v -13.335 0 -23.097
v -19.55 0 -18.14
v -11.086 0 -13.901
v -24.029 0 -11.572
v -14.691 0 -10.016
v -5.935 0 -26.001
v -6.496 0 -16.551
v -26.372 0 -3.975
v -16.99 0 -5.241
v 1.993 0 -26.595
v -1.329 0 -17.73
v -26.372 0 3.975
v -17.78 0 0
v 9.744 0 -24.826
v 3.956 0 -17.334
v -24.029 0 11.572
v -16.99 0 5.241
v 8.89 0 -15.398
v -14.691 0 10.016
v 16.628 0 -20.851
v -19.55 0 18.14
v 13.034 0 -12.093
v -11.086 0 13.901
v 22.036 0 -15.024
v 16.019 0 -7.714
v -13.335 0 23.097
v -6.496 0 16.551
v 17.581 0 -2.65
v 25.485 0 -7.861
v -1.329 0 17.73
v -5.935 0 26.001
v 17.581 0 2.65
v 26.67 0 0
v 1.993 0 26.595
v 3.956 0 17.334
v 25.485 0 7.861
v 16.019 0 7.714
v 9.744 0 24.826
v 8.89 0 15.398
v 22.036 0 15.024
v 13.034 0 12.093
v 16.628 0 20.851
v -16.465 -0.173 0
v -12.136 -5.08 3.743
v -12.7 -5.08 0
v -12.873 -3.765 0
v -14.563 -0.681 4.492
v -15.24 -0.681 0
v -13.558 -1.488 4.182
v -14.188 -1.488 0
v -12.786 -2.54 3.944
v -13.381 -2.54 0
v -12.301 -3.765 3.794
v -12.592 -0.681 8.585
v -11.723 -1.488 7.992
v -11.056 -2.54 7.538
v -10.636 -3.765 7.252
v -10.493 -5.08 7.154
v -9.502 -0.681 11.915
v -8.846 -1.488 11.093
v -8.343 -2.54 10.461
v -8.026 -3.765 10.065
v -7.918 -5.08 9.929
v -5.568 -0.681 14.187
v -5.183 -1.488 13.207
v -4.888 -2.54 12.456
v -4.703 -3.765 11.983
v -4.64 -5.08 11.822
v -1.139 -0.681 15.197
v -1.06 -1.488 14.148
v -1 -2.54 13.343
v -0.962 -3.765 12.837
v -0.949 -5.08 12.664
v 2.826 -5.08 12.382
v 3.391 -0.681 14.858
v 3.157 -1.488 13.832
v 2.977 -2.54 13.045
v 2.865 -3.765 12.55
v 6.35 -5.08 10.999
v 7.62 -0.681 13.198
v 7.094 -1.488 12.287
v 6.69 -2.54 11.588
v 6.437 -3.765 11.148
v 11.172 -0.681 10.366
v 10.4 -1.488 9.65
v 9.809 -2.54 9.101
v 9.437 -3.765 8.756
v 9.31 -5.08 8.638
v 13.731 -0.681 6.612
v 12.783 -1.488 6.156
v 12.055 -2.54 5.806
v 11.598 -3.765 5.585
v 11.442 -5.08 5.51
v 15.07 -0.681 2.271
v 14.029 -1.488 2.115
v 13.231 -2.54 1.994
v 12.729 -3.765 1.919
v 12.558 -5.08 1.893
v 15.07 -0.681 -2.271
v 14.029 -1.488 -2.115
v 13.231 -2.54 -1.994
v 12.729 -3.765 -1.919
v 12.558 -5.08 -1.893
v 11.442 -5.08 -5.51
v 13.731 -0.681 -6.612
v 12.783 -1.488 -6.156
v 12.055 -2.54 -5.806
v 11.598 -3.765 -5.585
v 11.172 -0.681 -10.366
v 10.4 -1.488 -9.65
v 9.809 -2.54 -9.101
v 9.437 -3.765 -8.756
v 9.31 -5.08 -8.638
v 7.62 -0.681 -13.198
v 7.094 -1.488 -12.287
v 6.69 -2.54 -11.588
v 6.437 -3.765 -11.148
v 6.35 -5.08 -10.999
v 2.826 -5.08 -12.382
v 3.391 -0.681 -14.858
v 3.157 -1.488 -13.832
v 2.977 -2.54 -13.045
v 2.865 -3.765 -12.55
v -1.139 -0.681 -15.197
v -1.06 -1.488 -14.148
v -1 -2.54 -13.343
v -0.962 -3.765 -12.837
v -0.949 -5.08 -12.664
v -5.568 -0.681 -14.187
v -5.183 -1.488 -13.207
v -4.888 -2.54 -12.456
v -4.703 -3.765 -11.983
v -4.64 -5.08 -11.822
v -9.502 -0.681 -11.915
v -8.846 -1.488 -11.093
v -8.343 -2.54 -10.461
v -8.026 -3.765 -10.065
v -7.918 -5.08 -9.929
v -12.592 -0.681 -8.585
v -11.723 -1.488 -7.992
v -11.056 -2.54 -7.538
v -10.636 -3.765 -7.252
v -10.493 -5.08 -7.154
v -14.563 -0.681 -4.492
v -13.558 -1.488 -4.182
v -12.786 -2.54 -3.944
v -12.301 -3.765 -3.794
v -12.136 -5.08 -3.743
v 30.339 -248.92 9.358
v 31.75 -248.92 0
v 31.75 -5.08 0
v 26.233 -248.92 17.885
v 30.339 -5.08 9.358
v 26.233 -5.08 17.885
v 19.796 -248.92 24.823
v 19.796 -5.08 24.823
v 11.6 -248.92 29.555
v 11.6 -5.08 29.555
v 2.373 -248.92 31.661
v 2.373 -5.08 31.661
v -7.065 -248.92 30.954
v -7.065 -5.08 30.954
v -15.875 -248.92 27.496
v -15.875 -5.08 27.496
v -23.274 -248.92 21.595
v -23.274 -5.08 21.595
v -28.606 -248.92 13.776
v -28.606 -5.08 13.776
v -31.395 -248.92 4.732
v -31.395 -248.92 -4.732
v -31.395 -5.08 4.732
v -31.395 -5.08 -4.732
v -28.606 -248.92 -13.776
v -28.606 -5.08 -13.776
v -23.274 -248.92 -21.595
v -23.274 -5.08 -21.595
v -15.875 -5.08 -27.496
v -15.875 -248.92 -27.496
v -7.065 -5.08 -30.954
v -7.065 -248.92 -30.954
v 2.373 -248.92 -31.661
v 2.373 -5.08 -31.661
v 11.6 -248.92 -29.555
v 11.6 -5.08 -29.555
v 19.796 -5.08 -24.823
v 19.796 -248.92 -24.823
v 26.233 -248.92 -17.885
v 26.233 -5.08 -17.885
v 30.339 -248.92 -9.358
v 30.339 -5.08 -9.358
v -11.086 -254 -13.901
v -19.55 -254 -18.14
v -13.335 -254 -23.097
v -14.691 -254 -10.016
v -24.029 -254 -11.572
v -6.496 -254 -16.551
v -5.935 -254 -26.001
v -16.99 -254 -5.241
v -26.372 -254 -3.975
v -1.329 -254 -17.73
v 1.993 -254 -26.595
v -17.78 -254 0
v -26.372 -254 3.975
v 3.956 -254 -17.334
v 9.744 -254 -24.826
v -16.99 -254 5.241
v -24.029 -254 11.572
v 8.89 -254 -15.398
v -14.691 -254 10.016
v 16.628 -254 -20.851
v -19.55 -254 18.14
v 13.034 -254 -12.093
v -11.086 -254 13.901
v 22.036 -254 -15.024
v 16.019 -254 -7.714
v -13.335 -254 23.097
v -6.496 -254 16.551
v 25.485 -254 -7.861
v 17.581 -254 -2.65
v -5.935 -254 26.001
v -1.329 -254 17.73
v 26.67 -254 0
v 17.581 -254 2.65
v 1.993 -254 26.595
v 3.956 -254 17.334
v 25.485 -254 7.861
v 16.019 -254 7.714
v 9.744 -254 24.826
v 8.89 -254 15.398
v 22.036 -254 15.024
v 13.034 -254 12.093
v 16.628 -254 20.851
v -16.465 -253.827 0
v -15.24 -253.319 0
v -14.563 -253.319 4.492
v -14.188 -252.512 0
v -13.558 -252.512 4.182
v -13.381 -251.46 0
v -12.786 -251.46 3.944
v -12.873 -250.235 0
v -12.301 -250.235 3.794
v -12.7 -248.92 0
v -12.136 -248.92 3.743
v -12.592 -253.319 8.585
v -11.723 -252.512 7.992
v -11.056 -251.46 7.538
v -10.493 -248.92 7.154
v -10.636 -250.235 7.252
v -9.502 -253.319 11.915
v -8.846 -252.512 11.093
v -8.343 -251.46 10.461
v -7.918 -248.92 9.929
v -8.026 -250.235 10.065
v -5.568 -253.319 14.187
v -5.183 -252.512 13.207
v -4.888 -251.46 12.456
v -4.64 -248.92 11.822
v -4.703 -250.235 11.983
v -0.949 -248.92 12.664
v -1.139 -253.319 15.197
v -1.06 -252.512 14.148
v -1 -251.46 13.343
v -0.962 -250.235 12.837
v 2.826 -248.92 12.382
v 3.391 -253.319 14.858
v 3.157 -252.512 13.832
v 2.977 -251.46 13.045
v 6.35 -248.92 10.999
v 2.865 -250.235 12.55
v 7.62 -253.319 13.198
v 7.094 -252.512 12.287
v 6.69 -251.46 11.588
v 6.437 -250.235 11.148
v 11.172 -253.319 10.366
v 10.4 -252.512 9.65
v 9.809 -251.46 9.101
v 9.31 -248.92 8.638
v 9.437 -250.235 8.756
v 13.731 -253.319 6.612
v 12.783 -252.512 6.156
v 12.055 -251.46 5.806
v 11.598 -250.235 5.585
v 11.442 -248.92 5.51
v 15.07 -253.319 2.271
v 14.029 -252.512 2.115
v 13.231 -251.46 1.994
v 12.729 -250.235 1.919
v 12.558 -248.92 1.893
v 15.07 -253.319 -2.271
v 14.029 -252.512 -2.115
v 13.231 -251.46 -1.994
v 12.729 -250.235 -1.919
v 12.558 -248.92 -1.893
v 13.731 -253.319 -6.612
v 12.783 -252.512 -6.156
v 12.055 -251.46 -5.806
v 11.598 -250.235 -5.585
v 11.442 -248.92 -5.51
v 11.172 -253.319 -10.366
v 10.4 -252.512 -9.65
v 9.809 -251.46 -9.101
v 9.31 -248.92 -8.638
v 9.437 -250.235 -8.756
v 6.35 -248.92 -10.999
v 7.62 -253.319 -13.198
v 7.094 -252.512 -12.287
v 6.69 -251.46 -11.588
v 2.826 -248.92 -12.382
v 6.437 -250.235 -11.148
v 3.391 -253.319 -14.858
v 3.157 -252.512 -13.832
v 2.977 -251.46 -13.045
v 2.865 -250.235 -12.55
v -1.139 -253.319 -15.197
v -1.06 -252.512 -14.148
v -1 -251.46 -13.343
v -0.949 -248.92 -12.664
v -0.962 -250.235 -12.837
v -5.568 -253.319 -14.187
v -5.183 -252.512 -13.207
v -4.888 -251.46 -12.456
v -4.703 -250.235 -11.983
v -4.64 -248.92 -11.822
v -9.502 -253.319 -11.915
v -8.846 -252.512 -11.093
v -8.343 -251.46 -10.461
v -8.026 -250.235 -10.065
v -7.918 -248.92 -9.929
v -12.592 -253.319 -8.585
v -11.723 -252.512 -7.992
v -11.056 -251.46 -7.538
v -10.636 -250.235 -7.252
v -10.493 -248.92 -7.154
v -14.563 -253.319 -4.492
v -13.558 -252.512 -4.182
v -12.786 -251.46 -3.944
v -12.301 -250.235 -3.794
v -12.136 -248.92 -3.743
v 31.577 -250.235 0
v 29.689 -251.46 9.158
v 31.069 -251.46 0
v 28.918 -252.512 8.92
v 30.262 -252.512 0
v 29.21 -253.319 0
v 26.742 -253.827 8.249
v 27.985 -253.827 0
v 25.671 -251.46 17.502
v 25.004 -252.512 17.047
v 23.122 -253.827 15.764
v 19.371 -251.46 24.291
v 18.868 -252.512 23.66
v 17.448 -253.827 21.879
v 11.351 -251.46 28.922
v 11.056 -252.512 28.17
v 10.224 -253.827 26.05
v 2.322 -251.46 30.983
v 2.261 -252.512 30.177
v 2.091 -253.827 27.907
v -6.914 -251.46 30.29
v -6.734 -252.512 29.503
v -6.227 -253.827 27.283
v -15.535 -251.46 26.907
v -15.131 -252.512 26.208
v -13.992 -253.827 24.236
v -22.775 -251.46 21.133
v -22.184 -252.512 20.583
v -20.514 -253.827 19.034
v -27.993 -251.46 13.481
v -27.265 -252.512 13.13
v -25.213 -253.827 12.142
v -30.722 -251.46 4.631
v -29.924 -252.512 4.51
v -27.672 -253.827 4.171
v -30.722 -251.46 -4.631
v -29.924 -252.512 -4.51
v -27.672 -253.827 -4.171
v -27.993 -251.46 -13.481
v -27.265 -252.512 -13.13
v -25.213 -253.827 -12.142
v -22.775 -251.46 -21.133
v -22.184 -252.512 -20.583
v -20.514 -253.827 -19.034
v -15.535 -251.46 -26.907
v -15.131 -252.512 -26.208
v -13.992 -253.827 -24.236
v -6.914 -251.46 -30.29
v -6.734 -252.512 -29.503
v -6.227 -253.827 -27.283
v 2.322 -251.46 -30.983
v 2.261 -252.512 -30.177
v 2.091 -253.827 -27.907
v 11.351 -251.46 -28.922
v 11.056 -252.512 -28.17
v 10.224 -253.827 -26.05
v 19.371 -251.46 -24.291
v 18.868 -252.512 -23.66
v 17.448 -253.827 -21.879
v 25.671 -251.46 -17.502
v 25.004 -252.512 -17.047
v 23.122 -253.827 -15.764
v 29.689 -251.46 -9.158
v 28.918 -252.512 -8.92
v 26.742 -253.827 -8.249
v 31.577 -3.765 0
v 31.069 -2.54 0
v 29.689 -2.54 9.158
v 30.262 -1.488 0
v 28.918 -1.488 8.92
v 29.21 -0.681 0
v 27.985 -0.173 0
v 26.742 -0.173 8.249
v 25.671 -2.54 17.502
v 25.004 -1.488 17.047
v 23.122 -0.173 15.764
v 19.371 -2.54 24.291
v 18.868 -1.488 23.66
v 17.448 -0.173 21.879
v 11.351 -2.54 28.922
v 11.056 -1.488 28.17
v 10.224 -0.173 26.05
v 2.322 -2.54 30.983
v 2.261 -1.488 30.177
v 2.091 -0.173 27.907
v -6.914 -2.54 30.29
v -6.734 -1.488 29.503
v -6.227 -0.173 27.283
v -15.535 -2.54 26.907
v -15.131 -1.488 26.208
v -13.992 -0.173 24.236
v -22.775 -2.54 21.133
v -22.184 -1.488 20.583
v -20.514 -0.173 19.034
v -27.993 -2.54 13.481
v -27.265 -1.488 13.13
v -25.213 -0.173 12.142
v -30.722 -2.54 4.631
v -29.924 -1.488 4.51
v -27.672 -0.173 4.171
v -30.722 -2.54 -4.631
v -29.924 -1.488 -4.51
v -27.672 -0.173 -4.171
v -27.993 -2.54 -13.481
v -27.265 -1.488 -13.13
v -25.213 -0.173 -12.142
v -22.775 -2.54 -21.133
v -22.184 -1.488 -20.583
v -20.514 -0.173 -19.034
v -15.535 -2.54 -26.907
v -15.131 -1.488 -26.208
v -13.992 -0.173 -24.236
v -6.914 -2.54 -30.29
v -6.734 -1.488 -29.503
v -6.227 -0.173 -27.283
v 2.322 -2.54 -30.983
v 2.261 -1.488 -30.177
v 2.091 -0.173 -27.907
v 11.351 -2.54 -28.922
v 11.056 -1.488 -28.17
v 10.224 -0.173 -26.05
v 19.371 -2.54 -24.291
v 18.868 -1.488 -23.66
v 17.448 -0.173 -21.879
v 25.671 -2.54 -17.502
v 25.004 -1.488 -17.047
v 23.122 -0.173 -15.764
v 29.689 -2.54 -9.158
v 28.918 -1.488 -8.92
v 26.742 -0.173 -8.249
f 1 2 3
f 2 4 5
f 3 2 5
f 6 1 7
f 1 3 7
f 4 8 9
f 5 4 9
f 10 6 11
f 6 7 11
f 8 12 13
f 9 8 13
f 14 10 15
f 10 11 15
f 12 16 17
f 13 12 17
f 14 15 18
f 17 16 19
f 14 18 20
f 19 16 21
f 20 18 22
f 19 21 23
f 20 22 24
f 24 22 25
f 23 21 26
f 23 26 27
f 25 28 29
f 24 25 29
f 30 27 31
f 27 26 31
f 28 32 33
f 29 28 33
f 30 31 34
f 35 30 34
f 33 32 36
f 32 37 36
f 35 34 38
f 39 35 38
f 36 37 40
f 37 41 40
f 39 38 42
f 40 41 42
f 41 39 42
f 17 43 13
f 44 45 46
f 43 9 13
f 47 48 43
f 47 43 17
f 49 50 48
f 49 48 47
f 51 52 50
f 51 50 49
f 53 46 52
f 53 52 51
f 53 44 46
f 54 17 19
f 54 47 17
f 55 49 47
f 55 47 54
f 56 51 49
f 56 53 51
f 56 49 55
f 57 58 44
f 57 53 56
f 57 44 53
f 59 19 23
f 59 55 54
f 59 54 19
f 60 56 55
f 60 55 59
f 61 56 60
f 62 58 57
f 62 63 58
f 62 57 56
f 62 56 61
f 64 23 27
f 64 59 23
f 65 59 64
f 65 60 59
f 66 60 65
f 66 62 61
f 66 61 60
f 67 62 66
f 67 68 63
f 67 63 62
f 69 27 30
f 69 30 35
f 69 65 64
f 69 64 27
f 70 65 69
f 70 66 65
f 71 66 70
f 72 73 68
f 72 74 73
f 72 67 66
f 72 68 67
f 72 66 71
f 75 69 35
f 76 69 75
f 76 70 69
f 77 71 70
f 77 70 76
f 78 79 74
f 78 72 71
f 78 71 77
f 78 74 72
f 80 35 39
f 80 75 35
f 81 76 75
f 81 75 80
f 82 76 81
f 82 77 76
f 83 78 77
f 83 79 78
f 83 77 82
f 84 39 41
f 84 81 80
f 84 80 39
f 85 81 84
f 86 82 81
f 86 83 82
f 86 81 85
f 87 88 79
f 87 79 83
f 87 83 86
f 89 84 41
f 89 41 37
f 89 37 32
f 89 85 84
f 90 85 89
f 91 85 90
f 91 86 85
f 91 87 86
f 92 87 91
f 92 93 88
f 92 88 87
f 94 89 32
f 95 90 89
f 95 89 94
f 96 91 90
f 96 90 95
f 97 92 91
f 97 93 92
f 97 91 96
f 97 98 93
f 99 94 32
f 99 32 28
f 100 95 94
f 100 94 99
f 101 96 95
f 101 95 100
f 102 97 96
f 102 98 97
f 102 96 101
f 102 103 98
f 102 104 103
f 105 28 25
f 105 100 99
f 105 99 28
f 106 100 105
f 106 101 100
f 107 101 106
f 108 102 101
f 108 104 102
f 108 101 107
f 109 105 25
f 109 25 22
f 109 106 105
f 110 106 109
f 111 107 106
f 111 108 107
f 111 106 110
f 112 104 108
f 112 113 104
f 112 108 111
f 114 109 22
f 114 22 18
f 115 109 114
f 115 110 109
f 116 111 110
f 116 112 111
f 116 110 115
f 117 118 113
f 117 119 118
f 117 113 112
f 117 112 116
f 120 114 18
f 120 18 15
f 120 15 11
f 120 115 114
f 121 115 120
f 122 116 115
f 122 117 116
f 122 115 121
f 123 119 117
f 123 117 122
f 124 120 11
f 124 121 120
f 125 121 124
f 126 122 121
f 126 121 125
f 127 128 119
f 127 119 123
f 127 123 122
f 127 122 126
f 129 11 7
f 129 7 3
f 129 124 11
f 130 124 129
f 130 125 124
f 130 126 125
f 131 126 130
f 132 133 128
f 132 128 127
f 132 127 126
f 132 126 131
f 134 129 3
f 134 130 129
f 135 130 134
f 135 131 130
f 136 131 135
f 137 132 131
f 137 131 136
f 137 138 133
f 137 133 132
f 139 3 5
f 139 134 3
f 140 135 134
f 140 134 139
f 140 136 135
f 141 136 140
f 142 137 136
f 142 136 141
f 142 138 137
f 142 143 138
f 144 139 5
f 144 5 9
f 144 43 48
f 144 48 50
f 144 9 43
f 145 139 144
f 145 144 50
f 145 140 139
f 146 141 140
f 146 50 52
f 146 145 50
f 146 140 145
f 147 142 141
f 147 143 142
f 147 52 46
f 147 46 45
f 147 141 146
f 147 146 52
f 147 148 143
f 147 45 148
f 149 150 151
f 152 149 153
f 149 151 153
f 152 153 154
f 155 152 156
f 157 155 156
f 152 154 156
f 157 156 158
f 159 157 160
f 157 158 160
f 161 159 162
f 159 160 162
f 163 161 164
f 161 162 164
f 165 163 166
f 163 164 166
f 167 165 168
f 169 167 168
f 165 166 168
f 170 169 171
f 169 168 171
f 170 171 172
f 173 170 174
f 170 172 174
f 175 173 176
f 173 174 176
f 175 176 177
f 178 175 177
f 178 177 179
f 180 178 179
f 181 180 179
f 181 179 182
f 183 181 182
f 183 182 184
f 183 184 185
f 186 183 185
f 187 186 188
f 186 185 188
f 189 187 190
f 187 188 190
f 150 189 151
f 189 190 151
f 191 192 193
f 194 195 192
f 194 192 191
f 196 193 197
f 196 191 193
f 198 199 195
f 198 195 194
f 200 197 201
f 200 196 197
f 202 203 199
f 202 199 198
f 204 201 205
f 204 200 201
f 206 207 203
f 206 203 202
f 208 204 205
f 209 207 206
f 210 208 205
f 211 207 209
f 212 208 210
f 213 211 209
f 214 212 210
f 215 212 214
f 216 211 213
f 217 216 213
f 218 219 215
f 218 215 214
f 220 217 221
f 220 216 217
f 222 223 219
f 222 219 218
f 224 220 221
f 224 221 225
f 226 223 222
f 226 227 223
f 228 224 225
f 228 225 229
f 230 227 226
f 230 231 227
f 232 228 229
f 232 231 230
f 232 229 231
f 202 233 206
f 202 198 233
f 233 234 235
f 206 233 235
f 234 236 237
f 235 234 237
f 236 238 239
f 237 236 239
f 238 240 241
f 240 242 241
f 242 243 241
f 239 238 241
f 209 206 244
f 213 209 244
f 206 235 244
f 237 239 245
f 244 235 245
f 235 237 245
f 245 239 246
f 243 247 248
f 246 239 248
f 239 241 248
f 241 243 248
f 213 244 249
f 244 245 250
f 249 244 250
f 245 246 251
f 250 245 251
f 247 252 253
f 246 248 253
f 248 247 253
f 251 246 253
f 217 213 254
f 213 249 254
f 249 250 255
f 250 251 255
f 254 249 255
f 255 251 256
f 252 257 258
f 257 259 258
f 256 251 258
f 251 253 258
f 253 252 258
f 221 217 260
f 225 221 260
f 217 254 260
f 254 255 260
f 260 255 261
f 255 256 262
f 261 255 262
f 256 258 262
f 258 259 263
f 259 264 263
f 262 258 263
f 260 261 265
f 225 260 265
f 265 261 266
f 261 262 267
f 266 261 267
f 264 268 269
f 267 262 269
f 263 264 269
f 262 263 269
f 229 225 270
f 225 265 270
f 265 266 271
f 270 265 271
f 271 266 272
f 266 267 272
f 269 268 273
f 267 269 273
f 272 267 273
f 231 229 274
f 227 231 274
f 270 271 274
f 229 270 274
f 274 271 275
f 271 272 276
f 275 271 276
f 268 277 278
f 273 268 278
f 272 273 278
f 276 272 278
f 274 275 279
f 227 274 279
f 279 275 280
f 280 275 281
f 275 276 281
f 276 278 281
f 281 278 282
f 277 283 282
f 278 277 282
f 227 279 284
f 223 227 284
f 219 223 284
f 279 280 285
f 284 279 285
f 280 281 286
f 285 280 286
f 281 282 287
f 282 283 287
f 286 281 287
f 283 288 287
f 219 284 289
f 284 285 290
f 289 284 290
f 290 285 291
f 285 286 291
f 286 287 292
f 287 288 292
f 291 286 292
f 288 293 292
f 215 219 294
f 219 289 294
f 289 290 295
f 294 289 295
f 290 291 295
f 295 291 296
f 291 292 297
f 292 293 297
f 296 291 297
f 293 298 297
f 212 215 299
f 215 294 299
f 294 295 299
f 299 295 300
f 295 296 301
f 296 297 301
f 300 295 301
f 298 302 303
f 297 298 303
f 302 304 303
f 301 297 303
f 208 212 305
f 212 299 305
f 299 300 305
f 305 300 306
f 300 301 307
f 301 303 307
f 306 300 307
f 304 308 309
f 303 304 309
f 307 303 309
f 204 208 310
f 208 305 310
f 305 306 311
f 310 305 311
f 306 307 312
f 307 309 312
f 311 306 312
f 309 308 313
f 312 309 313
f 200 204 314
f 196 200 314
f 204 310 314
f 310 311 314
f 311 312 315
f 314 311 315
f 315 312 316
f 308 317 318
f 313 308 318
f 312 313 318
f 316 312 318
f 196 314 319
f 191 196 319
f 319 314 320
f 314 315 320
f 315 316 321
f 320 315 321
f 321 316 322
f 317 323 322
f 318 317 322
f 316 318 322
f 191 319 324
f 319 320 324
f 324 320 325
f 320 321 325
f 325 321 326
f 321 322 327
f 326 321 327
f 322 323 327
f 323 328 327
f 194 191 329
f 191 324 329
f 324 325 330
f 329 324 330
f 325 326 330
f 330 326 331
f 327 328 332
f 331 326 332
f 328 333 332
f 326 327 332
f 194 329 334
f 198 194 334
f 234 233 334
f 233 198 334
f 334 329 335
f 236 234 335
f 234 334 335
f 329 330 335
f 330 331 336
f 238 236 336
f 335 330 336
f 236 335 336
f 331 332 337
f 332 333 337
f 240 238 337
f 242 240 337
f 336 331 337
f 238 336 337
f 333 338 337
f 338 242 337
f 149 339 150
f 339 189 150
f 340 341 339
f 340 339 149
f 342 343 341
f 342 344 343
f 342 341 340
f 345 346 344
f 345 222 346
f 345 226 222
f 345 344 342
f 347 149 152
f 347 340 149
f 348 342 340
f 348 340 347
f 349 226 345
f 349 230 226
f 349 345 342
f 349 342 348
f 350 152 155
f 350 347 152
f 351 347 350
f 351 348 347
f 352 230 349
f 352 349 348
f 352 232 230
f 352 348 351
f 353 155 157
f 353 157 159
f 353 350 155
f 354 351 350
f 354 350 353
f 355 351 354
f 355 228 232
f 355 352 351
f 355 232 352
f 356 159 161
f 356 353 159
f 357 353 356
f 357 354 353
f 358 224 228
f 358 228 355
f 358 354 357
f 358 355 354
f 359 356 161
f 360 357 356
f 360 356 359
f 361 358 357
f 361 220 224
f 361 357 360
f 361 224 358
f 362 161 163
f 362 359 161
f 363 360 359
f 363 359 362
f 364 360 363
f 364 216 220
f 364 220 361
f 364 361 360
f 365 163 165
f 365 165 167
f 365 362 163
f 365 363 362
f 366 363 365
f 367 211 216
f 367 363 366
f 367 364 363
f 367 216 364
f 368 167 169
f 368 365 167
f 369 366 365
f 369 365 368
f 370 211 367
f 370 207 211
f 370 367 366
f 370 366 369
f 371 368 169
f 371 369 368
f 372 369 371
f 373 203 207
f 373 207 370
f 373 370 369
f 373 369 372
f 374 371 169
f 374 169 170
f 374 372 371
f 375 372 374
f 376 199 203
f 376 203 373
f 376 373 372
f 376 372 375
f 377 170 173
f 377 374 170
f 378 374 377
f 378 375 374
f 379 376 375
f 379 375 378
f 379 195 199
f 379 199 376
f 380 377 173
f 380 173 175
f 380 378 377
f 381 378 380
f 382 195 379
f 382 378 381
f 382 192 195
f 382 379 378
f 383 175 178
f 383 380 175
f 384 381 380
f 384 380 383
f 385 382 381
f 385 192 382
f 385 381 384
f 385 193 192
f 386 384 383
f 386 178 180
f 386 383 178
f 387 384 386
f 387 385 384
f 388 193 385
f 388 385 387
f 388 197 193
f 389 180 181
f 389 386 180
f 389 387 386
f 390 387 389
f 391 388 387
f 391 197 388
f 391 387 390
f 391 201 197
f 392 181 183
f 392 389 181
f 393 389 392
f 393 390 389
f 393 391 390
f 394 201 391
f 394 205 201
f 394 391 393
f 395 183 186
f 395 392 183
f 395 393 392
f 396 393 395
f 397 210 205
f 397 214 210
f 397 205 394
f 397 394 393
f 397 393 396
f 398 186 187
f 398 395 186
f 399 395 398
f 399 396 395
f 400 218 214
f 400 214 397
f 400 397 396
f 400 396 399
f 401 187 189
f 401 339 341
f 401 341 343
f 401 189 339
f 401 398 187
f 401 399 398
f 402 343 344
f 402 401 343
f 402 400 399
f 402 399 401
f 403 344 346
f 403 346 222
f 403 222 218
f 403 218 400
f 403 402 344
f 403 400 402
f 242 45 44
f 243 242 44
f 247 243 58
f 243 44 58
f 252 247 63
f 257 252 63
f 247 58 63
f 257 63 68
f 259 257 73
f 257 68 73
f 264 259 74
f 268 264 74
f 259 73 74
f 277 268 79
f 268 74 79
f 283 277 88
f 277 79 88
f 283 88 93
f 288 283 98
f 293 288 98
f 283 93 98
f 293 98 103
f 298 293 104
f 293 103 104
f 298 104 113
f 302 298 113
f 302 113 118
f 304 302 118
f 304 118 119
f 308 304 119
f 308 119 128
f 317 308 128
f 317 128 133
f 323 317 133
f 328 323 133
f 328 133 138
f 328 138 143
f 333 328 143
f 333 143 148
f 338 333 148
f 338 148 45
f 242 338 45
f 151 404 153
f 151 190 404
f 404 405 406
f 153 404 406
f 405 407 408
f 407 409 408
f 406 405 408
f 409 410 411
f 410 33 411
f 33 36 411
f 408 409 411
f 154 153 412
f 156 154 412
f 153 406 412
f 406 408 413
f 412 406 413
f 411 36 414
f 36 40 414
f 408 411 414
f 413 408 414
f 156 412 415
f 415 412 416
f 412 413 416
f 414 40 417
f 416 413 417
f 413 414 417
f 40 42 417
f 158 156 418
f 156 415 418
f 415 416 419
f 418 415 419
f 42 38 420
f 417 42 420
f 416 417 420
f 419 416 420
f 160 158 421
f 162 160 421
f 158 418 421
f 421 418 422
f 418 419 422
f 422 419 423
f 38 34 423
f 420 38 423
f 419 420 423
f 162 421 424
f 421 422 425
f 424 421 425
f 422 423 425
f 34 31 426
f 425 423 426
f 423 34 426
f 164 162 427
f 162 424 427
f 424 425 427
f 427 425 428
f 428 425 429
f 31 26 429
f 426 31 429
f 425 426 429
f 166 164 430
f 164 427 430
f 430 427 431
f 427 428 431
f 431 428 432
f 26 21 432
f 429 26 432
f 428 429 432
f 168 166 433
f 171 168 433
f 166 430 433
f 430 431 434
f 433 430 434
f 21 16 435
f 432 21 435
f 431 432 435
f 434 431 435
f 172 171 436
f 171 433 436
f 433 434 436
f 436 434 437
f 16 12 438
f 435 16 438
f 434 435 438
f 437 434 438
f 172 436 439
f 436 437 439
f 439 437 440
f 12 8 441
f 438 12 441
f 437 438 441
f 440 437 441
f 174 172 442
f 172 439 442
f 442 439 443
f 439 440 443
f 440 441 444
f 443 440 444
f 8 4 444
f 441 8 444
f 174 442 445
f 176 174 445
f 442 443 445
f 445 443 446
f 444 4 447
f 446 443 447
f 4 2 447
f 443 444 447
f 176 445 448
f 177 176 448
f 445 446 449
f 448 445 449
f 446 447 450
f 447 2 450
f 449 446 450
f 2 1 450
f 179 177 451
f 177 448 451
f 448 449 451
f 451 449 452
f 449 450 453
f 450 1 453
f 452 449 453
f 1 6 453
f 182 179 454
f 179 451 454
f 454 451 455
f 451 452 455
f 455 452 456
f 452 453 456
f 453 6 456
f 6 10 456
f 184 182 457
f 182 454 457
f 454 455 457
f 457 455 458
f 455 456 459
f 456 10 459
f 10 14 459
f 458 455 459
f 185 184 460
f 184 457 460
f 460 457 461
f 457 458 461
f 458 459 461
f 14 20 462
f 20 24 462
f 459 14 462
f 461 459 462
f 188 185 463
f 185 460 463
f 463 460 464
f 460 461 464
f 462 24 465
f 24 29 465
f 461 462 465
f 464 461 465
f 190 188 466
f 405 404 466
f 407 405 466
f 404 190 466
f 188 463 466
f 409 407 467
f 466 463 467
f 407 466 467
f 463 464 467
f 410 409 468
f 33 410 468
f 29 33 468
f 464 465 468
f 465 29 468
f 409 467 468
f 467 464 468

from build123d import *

# Parameters (mm, degrees)
F0_R     = 31.75
F1_DEPTH = 254
F2_R     = 5.08
F3_R     = 5.08
F4_R     = 12.7
F5_DEPTH = 254.001
F6_R     = 5.08


with BuildPart() as f1:
    # F0 (on Front) → F1 (new body)
    with BuildSketch(Plane.XZ):
        Circle(F0_R)
    extrude(amount=F1_DEPTH)

    # F2
    f2_edges = [f1.edges().sort_by_distance(p)[0] for p in [
        (-31.75, -254, 0),
    ]]
    fillet(f2_edges, radius=F2_R)

    # F3
    f3_edges = [f1.edges().sort_by_distance(p)[0] for p in [
        (-31.75, 0, 0),
    ]]
    fillet(f3_edges, radius=F3_R)

    # F4 (on face) → F5 (cut, through all)
    with BuildSketch(Plane(origin=(0, 0, 0), x_dir=(-1, 0, 0), z_dir=(0, 1, 0))):
        Circle(F4_R)
    extrude(amount=-F5_DEPTH, mode=Mode.SUBTRACT)

    # F6
    f6_edges = [f1.edges().sort_by_distance(p)[0] for p in [
        (12.7, 0, 0),
        (-12.7, -127, 0),
        (12.7, -254, 0),
    ]]
    fillet(f6_edges, radius=F6_R)


solid = f1.part
